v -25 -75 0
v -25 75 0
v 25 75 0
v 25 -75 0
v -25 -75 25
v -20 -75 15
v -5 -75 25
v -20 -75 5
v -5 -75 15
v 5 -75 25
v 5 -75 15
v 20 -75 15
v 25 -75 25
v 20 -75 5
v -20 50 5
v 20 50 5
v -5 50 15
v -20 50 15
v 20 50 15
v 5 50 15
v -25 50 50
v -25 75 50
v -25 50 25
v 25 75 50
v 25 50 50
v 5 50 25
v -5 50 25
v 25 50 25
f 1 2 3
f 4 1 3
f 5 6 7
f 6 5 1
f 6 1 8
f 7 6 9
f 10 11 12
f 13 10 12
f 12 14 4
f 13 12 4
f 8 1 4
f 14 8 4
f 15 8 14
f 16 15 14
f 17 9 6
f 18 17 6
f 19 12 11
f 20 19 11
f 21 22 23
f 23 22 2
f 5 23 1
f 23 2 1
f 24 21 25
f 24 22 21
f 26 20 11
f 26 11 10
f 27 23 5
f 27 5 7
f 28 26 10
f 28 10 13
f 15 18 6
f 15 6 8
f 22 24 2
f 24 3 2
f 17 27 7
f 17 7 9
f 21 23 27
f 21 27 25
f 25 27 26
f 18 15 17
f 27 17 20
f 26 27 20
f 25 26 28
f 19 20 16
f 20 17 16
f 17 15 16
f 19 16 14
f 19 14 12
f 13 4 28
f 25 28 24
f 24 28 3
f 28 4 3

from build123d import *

# Parameters (mm, degrees)
F0_W     = 50
F0_H     = 150
F1_DEPTH = 25
F3_DEPTH = 125
F5_DEPTH = 25


with BuildPart() as f1:
    # F0 (on Top) → F1 (new body)
    with BuildSketch(Plane.XY):
        Rectangle(F0_W, F0_H)
    extrude(amount=F1_DEPTH)

    # F2 (on face) → F3 (cut)
    with BuildSketch(Plane.XZ.offset(75)):
        Polygon((5, 25), (0, 25), (-5, 25), (-5, 15), (-20, 15), (-20, 5), (0, 5), (20, 5), (20, 15), (5, 15), align=None)
    extrude(amount=-F3_DEPTH, mode=Mode.SUBTRACT)

    # F4 (on face) → F5 (join)
    with BuildSketch(Plane.XY.offset(25)):
        Polygon((-25, 50), (-5, 50), (5, 50), (25, 50), (25, 75), (-25, 75), align=None)
    extrude(amount=F5_DEPTH)


solid = f1.part
